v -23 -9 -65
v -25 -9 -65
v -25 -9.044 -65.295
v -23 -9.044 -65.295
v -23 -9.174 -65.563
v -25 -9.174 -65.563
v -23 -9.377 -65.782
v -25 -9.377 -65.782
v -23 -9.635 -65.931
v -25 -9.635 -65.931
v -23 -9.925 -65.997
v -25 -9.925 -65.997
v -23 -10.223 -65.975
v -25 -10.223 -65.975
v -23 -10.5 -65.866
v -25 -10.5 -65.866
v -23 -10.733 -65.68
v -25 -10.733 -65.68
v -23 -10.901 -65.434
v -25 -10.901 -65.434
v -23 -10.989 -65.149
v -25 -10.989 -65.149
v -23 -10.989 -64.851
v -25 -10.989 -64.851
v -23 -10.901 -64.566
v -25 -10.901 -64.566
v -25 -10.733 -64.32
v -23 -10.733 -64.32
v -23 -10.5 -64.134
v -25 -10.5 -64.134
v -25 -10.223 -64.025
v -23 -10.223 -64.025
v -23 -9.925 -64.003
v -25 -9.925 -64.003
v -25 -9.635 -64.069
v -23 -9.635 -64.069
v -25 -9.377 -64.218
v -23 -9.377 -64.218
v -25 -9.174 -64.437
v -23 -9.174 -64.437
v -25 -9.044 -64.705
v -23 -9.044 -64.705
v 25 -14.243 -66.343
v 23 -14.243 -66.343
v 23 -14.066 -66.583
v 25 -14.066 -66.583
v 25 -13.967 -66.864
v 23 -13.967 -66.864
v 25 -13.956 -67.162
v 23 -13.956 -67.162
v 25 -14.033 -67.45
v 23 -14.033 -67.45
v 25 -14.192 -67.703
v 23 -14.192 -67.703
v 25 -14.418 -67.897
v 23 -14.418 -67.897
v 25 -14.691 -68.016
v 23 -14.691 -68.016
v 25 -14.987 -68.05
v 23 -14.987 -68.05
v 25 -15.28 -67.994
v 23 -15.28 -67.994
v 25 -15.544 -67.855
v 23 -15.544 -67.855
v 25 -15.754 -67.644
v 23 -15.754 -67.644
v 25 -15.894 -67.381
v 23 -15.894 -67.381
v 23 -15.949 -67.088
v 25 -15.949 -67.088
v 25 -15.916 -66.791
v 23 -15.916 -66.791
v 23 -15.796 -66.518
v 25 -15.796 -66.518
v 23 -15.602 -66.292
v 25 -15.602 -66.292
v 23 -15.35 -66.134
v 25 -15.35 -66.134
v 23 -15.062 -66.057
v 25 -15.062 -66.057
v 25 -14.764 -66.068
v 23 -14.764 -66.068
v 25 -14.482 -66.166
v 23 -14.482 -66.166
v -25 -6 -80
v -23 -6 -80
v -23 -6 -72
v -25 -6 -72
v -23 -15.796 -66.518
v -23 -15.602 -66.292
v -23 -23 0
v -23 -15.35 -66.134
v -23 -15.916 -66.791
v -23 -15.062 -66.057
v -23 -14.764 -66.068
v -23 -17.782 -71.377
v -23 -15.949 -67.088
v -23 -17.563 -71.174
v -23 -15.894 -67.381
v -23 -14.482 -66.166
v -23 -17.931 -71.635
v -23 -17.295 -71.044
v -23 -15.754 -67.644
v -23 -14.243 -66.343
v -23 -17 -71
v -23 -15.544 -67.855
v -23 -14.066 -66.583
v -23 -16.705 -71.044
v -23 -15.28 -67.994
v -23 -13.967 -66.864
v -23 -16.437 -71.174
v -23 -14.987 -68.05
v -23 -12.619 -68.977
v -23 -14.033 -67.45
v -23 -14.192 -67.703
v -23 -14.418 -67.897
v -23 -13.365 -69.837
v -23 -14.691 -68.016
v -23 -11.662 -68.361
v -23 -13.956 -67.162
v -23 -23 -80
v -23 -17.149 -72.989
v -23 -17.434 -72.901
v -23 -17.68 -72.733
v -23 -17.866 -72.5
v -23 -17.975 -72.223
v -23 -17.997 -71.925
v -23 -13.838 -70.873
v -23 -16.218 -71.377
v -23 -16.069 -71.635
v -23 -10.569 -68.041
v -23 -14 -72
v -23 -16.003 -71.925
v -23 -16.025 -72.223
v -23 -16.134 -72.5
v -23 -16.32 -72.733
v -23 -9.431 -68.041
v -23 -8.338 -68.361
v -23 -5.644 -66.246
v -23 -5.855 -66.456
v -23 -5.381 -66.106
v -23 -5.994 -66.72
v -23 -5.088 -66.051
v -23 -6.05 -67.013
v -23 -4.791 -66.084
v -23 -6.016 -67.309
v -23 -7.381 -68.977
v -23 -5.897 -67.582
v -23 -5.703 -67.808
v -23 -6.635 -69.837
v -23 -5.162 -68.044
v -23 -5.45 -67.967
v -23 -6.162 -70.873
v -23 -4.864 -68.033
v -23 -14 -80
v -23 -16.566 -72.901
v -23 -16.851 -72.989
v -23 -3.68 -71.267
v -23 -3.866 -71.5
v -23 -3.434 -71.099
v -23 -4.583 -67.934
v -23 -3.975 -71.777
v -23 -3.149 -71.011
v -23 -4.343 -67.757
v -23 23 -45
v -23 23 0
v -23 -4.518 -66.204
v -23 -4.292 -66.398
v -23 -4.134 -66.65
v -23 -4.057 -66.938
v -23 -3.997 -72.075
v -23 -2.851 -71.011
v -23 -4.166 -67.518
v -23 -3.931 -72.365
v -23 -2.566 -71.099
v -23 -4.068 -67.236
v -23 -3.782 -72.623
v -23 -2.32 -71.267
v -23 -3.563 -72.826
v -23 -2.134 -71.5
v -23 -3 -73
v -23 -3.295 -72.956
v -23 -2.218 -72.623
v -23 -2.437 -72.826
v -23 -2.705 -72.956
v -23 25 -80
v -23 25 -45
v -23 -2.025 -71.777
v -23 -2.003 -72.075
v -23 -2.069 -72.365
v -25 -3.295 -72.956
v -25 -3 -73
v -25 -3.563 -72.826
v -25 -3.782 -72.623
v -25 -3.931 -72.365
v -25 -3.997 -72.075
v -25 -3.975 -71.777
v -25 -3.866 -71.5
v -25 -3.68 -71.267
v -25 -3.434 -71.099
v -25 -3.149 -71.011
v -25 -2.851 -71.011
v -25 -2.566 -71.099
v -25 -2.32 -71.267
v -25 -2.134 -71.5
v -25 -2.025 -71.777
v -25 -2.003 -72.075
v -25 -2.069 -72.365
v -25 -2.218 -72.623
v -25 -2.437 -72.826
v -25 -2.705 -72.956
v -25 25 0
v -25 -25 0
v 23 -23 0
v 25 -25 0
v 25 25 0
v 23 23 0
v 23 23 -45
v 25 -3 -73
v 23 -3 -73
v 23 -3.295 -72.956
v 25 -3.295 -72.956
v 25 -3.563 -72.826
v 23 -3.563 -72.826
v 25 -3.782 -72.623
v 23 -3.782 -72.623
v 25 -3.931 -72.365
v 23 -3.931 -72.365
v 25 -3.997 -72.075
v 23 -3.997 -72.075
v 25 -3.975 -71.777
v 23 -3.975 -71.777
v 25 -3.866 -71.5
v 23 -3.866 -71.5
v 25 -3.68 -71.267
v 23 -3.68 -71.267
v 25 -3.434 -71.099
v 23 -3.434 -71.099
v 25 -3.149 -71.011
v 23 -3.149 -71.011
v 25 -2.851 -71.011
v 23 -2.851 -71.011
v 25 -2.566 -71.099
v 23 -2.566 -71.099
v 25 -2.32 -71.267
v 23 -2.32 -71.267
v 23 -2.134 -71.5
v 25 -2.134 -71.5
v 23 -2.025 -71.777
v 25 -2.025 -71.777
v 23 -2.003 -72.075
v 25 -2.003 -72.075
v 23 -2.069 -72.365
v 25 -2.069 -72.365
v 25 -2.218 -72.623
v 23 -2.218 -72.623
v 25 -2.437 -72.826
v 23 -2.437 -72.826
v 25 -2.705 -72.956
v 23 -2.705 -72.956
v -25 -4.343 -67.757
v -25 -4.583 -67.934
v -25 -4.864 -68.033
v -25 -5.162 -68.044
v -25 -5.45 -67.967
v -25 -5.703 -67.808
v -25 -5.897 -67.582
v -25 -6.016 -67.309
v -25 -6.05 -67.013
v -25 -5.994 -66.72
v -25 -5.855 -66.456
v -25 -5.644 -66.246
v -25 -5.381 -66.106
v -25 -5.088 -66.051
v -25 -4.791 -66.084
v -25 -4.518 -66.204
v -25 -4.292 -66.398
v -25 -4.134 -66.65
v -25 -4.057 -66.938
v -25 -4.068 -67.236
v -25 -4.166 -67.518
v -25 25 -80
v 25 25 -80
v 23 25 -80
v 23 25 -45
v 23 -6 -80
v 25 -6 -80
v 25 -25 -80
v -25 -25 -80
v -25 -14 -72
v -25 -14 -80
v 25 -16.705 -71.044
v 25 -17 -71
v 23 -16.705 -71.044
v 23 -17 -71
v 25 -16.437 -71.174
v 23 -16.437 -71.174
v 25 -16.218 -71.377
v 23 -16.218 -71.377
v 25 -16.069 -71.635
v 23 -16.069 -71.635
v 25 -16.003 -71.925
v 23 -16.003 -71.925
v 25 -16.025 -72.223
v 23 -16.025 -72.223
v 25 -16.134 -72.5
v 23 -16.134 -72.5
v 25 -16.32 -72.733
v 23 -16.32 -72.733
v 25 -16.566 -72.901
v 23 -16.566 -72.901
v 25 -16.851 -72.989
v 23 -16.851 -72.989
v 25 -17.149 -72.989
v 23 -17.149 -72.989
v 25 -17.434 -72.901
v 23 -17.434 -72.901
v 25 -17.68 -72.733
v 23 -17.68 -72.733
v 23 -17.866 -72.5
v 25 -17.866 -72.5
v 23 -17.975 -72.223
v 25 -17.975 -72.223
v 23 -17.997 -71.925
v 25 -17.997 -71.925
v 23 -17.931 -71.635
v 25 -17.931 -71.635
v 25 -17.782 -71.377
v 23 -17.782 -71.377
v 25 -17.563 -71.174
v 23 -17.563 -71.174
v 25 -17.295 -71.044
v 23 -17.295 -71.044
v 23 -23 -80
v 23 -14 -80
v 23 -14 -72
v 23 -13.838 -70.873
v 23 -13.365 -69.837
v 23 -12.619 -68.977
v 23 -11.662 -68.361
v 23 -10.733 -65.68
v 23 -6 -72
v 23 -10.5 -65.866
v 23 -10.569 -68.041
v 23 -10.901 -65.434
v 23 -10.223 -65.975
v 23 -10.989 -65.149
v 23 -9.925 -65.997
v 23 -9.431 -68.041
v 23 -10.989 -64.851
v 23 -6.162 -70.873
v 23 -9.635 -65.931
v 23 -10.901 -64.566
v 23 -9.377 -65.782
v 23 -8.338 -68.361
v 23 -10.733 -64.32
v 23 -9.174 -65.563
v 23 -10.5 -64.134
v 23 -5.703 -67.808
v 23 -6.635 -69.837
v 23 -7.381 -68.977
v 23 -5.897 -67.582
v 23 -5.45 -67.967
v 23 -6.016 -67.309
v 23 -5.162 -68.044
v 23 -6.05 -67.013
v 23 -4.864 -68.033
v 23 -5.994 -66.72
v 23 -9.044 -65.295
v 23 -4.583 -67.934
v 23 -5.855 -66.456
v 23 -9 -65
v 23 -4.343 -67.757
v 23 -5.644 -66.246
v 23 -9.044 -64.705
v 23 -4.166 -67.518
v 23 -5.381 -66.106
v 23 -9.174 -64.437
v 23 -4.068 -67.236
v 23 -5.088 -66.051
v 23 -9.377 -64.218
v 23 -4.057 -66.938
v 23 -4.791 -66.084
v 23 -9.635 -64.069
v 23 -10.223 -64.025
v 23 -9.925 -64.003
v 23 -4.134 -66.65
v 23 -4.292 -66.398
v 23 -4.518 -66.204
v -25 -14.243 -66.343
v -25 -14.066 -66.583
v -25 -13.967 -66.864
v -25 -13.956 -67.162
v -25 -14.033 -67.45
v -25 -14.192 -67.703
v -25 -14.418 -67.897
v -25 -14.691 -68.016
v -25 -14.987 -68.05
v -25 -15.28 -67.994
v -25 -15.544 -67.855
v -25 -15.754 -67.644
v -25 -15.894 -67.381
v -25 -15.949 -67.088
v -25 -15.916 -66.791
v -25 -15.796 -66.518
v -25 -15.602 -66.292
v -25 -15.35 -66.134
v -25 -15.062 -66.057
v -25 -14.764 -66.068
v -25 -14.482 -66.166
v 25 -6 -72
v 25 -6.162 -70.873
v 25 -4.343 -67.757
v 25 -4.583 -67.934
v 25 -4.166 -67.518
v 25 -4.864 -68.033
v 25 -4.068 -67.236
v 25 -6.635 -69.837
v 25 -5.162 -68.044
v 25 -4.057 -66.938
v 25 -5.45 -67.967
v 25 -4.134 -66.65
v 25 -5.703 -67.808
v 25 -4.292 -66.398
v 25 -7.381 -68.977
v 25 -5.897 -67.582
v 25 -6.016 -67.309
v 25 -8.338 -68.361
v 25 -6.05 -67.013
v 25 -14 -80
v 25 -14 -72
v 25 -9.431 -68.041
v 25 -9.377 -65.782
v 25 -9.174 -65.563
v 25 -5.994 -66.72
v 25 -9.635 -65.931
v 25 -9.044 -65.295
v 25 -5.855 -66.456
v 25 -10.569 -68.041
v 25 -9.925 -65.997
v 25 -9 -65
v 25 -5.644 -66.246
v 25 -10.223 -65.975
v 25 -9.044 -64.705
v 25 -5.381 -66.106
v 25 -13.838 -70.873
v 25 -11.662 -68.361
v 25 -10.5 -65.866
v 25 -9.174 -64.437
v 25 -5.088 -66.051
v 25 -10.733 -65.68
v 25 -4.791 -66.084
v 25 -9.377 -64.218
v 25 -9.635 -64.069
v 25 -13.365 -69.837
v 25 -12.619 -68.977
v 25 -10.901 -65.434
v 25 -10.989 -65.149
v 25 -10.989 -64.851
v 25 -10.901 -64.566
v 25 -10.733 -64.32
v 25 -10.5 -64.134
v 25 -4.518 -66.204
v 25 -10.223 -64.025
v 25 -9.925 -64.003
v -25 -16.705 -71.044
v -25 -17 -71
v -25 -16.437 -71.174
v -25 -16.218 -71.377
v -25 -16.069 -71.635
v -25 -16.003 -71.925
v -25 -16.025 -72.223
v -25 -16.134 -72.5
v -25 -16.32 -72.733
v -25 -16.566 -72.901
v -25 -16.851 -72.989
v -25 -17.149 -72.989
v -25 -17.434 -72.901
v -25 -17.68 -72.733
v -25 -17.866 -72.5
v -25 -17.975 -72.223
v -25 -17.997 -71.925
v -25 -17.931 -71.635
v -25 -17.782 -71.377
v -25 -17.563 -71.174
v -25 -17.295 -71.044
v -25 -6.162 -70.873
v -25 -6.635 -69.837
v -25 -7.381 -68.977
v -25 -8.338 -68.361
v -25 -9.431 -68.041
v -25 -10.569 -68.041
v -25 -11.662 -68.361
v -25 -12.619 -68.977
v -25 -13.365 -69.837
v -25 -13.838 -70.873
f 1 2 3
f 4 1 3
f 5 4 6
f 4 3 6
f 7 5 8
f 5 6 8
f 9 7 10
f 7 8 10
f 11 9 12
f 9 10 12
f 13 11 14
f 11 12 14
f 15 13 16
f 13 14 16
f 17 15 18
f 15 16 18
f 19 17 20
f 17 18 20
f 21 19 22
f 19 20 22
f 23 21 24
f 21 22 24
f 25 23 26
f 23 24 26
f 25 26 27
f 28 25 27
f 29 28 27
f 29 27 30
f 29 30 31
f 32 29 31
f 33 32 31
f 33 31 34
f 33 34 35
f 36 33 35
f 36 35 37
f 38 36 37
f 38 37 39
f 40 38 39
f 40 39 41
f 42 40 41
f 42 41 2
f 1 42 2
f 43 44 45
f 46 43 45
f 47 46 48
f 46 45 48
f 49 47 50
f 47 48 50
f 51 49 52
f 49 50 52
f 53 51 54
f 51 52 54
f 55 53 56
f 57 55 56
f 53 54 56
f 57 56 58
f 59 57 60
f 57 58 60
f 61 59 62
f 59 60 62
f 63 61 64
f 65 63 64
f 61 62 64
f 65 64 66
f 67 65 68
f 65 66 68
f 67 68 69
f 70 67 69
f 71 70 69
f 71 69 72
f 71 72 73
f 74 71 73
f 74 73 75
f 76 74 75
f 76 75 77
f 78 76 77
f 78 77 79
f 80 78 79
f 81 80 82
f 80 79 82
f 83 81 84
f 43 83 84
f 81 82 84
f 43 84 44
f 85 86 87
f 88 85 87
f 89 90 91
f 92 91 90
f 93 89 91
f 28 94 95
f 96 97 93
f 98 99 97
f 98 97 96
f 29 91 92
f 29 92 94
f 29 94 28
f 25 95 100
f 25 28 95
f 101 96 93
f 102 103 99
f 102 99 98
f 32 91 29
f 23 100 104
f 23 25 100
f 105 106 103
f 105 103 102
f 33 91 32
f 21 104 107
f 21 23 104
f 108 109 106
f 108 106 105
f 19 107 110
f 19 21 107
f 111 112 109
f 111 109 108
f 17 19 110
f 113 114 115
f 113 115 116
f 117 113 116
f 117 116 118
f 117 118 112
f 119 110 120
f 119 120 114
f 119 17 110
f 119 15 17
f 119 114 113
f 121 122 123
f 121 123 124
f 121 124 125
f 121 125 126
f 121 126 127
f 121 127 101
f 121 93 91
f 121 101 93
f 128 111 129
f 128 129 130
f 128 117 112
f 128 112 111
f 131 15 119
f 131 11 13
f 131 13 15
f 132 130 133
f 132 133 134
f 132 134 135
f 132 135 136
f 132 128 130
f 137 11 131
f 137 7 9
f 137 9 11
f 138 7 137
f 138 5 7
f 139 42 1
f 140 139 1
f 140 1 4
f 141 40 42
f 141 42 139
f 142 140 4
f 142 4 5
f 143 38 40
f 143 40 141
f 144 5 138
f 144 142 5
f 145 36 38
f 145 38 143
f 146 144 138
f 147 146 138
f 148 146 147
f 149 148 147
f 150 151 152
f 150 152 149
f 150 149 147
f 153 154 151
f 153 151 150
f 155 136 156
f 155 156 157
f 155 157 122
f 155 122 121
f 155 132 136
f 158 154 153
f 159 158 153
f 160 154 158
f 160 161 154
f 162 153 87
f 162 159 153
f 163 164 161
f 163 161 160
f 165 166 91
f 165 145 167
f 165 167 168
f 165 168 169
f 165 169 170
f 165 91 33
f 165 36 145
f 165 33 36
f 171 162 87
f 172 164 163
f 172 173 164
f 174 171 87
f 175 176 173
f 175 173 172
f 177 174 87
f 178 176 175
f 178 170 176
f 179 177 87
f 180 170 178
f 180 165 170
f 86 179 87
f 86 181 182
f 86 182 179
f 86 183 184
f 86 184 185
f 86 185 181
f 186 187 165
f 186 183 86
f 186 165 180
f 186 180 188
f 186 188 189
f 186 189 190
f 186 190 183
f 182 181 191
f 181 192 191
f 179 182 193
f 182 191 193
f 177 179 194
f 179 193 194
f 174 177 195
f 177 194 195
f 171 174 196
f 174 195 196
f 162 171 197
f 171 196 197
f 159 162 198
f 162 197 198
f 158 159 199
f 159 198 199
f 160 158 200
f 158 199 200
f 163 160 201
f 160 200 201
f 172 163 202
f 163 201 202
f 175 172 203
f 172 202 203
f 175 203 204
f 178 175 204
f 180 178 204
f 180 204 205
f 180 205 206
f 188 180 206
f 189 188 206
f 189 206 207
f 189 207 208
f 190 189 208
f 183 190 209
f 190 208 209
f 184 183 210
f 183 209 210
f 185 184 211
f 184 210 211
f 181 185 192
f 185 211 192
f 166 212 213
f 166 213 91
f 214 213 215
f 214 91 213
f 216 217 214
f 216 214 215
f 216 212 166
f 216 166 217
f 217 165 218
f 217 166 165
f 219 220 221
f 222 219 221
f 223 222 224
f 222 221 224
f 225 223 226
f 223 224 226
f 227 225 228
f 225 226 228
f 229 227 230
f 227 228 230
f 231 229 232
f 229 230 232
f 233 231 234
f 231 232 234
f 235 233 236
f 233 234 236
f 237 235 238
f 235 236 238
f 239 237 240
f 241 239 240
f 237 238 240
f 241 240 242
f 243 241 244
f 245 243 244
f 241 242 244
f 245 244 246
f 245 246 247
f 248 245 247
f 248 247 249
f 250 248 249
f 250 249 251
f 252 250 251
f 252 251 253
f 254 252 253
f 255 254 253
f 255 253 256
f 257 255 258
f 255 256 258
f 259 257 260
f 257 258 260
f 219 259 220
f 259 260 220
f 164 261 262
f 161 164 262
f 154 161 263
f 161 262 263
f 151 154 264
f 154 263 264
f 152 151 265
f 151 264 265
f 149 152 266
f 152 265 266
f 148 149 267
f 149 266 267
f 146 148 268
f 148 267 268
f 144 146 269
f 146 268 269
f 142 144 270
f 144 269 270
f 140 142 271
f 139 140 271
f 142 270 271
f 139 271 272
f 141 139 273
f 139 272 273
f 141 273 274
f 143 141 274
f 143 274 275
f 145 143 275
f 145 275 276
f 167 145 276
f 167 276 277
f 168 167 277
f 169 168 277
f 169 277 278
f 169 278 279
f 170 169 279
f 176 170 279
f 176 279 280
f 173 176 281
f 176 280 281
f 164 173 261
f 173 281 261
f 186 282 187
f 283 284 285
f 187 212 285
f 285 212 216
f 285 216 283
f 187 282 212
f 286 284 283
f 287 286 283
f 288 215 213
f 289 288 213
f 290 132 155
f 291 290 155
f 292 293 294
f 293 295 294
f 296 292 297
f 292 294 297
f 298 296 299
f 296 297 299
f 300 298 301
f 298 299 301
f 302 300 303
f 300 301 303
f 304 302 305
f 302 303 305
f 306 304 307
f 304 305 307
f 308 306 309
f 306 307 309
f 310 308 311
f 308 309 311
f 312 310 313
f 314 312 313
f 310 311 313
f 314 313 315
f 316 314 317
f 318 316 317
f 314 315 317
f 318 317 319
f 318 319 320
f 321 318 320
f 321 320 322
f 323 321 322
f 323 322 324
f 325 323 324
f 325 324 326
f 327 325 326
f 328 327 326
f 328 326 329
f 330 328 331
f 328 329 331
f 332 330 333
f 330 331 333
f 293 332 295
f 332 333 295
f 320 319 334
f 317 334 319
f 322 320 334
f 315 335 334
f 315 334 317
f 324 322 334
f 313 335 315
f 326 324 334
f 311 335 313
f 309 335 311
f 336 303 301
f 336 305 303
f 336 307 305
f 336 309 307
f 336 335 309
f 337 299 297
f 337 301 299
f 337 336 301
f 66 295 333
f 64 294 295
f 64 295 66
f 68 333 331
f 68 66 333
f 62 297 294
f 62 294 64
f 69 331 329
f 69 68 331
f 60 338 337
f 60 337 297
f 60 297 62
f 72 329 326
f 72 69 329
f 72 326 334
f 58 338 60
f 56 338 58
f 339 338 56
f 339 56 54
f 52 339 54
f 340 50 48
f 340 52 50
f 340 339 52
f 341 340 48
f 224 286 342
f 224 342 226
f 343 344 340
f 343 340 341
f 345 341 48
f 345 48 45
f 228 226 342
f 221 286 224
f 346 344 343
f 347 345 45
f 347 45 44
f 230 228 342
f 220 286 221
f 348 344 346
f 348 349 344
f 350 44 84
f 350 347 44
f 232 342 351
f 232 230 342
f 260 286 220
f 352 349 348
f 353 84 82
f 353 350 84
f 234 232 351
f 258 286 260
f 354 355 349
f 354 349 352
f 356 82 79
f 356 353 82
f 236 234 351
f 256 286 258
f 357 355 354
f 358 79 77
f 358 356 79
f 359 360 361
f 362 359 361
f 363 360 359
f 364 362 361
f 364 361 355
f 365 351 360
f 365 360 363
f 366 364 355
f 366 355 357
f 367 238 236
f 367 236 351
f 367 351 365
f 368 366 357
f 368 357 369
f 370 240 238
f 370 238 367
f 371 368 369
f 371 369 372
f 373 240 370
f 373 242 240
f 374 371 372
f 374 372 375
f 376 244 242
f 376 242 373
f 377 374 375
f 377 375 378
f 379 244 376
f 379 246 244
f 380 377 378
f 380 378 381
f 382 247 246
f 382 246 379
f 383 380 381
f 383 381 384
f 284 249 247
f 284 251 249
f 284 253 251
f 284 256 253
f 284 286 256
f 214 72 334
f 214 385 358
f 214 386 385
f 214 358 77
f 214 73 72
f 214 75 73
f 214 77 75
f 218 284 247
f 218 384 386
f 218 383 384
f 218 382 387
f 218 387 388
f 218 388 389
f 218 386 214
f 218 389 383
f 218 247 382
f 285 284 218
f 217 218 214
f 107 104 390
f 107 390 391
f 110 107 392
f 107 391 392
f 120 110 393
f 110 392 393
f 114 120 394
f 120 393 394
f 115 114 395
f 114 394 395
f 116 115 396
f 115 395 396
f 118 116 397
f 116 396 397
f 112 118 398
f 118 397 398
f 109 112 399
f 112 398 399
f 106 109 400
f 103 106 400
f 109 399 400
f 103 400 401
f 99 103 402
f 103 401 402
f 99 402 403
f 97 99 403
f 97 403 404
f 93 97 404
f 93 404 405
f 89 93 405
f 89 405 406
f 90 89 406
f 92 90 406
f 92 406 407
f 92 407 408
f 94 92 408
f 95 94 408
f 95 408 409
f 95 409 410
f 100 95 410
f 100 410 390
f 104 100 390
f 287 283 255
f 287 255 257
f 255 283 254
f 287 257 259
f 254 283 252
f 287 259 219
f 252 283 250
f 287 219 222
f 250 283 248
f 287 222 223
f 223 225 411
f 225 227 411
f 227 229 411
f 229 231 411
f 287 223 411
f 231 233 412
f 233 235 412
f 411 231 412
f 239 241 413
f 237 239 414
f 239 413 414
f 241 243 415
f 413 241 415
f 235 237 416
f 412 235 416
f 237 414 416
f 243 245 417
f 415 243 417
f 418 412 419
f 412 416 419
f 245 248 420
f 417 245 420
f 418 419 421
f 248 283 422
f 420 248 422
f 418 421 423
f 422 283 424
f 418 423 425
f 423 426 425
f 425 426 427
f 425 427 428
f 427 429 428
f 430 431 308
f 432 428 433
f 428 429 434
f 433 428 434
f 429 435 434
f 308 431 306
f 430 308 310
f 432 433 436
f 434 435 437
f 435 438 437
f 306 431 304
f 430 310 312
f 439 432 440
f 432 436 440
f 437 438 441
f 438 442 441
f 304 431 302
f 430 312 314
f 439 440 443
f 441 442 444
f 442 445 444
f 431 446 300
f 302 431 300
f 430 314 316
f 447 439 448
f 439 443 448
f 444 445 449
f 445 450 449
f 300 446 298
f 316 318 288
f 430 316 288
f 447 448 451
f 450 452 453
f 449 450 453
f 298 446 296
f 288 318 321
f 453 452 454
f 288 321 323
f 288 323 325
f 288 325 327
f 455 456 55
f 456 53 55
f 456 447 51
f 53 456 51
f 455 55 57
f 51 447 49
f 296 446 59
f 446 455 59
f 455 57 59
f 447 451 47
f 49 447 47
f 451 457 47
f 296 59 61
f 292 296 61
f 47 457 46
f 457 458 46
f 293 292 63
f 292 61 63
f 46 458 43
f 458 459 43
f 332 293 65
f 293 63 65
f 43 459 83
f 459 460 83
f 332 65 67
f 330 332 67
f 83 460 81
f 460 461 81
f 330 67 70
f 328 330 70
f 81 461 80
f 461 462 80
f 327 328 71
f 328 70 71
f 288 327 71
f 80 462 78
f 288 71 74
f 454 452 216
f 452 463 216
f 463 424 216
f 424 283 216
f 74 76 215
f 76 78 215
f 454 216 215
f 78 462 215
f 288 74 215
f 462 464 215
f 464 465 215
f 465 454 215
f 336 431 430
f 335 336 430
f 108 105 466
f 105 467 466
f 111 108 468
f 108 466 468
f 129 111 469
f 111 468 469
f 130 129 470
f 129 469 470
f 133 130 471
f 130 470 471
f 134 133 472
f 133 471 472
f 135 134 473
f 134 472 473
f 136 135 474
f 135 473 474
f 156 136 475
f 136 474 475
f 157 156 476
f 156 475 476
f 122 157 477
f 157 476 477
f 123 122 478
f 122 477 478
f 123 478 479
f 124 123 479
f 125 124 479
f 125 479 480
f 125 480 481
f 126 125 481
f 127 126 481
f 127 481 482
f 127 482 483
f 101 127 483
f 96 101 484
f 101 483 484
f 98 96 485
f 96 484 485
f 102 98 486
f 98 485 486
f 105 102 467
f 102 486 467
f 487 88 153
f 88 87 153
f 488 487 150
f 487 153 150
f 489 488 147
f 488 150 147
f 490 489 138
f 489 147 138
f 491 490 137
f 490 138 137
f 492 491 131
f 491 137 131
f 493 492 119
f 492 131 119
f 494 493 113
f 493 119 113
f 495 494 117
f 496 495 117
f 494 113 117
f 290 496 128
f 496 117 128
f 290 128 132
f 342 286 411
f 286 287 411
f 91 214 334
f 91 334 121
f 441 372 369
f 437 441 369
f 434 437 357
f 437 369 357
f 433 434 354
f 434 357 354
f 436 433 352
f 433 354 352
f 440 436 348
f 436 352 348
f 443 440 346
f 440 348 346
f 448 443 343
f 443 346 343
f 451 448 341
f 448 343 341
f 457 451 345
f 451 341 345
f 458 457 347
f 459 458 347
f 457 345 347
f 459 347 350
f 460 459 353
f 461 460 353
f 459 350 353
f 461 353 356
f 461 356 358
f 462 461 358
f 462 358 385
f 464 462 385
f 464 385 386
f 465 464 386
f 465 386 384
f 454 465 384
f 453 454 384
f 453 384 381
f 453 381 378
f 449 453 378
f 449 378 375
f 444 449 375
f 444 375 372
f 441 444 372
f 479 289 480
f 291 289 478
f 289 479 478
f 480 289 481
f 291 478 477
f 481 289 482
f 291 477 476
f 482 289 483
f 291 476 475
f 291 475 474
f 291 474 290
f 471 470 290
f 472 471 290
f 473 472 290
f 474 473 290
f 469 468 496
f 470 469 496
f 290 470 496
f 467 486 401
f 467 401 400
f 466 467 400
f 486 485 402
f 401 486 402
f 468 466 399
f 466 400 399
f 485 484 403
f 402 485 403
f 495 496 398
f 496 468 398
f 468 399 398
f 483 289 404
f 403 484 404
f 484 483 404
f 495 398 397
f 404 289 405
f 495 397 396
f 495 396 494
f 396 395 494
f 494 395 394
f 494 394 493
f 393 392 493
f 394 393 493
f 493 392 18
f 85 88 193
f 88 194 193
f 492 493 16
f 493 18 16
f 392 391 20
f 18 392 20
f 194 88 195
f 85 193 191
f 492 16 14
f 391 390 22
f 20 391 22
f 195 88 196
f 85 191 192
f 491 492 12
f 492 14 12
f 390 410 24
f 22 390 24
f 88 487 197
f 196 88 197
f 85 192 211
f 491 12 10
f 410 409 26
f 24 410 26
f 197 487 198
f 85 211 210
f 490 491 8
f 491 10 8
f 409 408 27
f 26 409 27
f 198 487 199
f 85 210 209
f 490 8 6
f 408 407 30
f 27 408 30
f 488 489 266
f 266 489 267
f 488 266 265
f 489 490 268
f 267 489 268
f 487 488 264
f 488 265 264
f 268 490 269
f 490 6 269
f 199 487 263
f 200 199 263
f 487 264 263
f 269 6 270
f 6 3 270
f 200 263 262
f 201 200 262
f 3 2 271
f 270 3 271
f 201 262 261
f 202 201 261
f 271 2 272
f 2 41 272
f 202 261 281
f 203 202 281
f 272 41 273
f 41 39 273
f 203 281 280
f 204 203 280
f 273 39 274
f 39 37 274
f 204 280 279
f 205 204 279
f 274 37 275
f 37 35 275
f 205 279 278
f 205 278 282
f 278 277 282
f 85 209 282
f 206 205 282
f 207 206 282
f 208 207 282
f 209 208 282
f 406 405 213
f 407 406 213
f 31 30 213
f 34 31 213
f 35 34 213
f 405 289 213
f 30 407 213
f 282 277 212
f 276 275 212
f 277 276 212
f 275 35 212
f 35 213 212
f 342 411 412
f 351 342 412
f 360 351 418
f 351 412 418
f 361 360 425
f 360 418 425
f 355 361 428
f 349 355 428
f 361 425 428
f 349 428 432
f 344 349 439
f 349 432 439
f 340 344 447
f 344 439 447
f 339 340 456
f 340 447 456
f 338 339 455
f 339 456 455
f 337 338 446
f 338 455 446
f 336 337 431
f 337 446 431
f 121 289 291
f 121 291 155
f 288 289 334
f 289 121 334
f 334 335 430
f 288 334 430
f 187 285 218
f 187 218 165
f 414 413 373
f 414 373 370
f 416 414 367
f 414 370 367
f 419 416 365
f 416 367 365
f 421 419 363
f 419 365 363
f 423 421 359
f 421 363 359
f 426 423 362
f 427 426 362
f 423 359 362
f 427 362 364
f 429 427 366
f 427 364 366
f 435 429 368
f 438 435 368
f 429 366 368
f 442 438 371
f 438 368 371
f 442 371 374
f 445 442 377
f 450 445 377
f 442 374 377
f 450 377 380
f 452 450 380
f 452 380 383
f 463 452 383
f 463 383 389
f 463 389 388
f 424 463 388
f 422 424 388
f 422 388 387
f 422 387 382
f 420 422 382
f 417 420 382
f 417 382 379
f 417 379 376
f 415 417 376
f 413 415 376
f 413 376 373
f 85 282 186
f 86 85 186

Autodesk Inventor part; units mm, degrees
ref_plane "YZ Plane" through (0, 0, 0) normal (1, 0, 0) x (0, 1, 0)
ref_plane "XZ Plane" through (0, 0, 0) normal (0, 1, 0) x (-1, 0, 0)
ref_plane "XY Plane" through (0, 0, 0) normal (0, 0, 1) x (1, 0, 0)
sketch "スケッチ1" plane through (0, 0, 0) normal (0, 0, 1) x (1, 0, 0)
  line L0 (-25, 25) -> (25, 25)
  line L1 (25, 25) -> (25, -25)
  line L2 (25, -25) -> (-25, -25)
  line L3 (-25, -25) -> (-25, 25)
  line L4 (-23, 23) -> (23, 23)
  line L5 (23, 23) -> (23, -23)
  line L6 (23, -23) -> (-23, -23)
  line L7 (-23, -23) -> (-23, 23)
  point P0 (0, 0)
  dimension "d0" = 50
  dimension "d2" = 50
  dimension "d3" = 46
  dimension "d4" = 23
  dimension "d5" = 23
  dimension "d6" = 25
  dimension "d7" = 46
  dimension "d8" = 25
extrude "押し出し1" add sketch "スケッチ1" against normal blind 80
sketch "スケッチ2" plane through (25, -25, 0) normal (1, 0, 0) x (0, 0, -1)
  line L0 (0, 0) -> (80, 0) projected
  line L1 (80, 50) -> (80, 0) projected
  line L2 (80, 19) -> (72, 19)
  line L3 (72, 11) -> (80, 11)
  line L4 (80, 11) -> (80, 19)
  arc A0 (72, 19) -> (72, 11) centre (72, 15) ccw
  point P0 (0, 25)
  dimension "d11" = 8
  dimension "d15" = 4
  dimension "d16" = 8
  dimension "d17" = 15
  dimension "d18" = 8
  dimension "d19" = 8
extrude "押し出し2" cut sketch "スケッチ2" against normal blind 60
sketch "スケッチ3" plane through (25, -25, 0) normal (1, 0, 0) x (0, 0, -1)
  arc A0 (72, 19) -> (72, 11) centre (72, 15) ccw projected
  circle A1 centre (72, 22) radius 1
  point P0 (0, 25)
  dimension "d22" = 0
  dimension "d23" = 7
  dimension "d24" = 2
hole "穴1" at (25, -3, -72) direction (-1, 0, 0) diameter 2 end through all
pattern_circular "円形状パターン1" count 5 over 180 about axis through (25, -10, -72) along (1, 0, 0) of "穴1"
sketch "スケッチ4" plane through (-25, 25, 0) normal (0, 1, 0) x (1, 0, 0)
  line L0 (50, 0) -> (50, 80) projected
  line L1 (0, 80) -> (50, 80) projected
  line L2 (2, 80) -> (48, 80)
  line L3 (48, 80) -> (48, 45)
  line L4 (48, 45) -> (2, 45)
  line L5 (2, 45) -> (2, 80)
  point P0 (25, 0)
  dimension "d35" = 46
  dimension "d37" = 2
  dimension "d38" = 35
extrude "押し出し3" cut sketch "スケッチ4" against normal blind 30
properties part number "Arm_Fifth_Flame"
